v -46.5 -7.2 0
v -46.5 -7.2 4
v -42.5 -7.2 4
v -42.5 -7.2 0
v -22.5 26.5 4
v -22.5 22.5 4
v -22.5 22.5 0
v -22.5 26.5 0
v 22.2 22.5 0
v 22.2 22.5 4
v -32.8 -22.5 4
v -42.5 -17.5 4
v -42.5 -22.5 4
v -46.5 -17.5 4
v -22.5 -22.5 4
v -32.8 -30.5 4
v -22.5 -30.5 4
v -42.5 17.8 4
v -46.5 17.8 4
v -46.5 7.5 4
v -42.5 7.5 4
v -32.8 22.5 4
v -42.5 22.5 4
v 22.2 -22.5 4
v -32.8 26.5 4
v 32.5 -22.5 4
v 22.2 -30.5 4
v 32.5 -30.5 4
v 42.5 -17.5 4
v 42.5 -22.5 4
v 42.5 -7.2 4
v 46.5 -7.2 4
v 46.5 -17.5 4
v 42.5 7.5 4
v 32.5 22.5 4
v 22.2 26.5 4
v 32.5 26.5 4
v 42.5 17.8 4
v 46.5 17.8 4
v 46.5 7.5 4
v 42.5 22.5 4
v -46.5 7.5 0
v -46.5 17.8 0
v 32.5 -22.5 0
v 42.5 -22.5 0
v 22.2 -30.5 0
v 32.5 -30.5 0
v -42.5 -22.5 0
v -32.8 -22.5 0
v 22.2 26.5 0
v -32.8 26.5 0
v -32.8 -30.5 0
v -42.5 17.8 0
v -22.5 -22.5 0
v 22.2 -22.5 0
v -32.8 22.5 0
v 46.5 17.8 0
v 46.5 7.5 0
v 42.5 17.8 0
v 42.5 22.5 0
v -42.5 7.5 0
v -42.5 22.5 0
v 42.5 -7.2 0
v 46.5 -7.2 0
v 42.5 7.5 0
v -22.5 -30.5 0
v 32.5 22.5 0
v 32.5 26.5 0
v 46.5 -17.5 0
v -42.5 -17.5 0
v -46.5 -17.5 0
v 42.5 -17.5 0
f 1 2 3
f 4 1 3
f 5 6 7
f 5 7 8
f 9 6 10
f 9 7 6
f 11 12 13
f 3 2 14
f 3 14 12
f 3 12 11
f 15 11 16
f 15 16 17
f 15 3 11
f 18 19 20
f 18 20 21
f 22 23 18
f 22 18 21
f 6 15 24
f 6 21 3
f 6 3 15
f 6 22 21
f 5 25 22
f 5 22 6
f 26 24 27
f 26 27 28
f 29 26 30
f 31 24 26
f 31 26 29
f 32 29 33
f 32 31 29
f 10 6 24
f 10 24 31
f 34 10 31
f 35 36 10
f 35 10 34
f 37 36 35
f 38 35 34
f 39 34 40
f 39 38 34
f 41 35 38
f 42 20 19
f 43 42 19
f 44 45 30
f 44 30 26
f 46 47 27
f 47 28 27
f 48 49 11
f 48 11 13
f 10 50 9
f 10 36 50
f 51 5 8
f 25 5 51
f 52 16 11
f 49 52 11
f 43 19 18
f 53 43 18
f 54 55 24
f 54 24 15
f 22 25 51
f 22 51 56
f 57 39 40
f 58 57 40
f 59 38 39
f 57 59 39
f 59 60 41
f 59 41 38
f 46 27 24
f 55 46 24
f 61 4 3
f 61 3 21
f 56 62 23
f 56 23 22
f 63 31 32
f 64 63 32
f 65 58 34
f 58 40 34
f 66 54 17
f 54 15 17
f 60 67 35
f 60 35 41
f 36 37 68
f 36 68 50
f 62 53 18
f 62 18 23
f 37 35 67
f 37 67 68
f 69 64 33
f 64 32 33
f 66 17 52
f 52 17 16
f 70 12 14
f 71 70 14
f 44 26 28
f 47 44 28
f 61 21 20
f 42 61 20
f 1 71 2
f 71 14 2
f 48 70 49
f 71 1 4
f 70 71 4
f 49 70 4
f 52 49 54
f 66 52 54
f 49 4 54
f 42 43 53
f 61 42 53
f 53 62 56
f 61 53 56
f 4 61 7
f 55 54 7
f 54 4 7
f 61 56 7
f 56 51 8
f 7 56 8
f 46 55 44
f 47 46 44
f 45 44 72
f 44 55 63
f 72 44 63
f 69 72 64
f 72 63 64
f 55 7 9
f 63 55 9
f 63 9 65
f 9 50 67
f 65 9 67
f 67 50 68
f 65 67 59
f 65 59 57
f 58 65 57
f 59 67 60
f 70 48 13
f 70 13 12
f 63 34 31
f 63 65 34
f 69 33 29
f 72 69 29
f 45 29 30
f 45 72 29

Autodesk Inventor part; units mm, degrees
ref_plane "YZ Plane" through (0, 0, 0) normal (1, 0, 0) x (0, 1, 0)
ref_plane "XZ Plane" through (0, 0, 0) normal (0, 1, 0) x (-1, 0, 0)
sketch "Sketch1" plane through (0, 0, 0) normal (0, 0, 1) x (1, 0, 0)
  line L0 (42.5, -22.5) -> (-42.5, -22.5)
  line L1 (-42.5, -22.5) -> (-42.5, 22.5)
  line L2 (-42.5, 22.5) -> (42.5, 22.5)
  line L3 (42.5, 22.5) -> (42.5, -22.5)
  line L4 (42.5, -22.5) -> (-42.5, 22.5) construction
  line L5 (-42.5, -22.5) -> (42.5, 22.5) construction
  point P0 (0, 0)
  dimension "d0" = 85
  dimension "d1" = 45
extrude "Extrusion1" add sketch "Sketch1" along normal blind 4
sketch "Sketch2" plane through (0, 0, 4) normal (0, 0, 1) x (1, 0, 0)
  line L0 (-42.5, -22.5) -> (42.5, -22.5) projected
  line L1 (42.5, -22.5) -> (42.5, 22.5) projected
  line L2 (42.5, 22.5) -> (-42.5, 22.5) projected
  line L3 (-42.5, 22.5) -> (-42.5, -22.5) projected
  line L4 (42.5, -22.5) -> (42.5, 22.5) projected
  line L5 (42.5, 17.8) -> (46.5, 17.8)
  line L6 (46.5, 17.8) -> (46.5, 7.5)
  line L7 (46.5, 7.5) -> (42.5, 7.5)
  line L8 (42.5, 7.5) -> (42.5, 17.8)
  line L9 (42.5, -7.2) -> (46.5, -7.2)
  line L10 (46.5, -7.2) -> (46.5, -17.5)
  line L11 (46.5, -17.5) -> (42.5, -17.5)
  line L12 (42.5, -17.5) -> (42.5, -7.2)
  point P0 (0, 0)
  dimension "d4" = 4
  dimension "d5" = 10.3
  dimension "d6" = 4
  dimension "d7" = 10.3
extrude "Extrusion2" add sketch "Sketch2" against normal blind 4 contours L1 L9 L10 L11 | L5 L6 L7 L1
ref_plane "Work Plane1" through (0, -7.2, 0) normal (1, 0, 0) x (0, 0, -1)
mirror "Mirror1" about plane through (0, -7.2, 0) normal (1, 0, 0) of "Extrusion2"
sketch "Sketch3" plane through (0, 0, 4) normal (0, 0, 1) x (1, 0, 0)
  line L0 (-42.5, -22.5) -> (42.5, -22.5) projected
  line L1 (-32.8, -22.5) -> (-22.5, -22.5)
  line L2 (-22.5, -22.5) -> (-22.5, -30.5)
  line L3 (-22.5, -30.5) -> (-32.8, -30.5)
  line L4 (-32.8, -30.5) -> (-32.8, -22.5)
  line L5 (22.2, -22.5) -> (32.5, -22.5)
  line L6 (32.5, -22.5) -> (32.5, -30.5)
  line L7 (32.5, -30.5) -> (22.2, -30.5)
  line L8 (22.2, -30.5) -> (22.2, -22.5)
  line L9 (-42.5, -17.5) -> (-42.5, -22.5) projected
  line L10 (42.5, -22.5) -> (42.5, -17.5) projected
  point P0 (0, 0)
  dimension "d12" = 10.3
  dimension "d13" = 8
  dimension "d14" = 10.3
  dimension "d15" = 8
extrude "Extrusion3" add sketch "Sketch3" against normal blind 4
sketch "Sketch5" plane through (0, 0, 4) normal (0, 0, 1) x (1, 0, 0)
  line L0 (42.5, 22.5) -> (-42.5, 22.5) projected
  line L1 (-32.8, 22.5) -> (-22.5, 22.5)
  line L2 (-22.5, 22.5) -> (-22.5, 26.5)
  line L3 (-22.5, 26.5) -> (-32.8, 26.5)
  line L4 (-32.8, 26.5) -> (-32.8, 22.5)
  line L5 (22.2, 22.5) -> (32.5, 22.5)
  line L6 (32.5, 22.5) -> (32.5, 26.5)
  line L7 (32.5, 26.5) -> (22.2, 26.5)
  line L8 (22.2, 26.5) -> (22.2, 22.5)
  line L9 (-42.5, 22.5) -> (-42.5, 17.8) projected
  line L10 (42.5, 17.8) -> (42.5, 22.5) projected
  point P0 (0, 0)
  dimension "d20" = 10.3
  dimension "d21" = 4
  dimension "d22" = 10.3
  dimension "d23" = 4
extrude "Extrusion4" add sketch "Sketch5" against normal blind 4
equation "\"d5\" = d"
equation "\"d7\" = d"
equation "\"d12\" = d"
equation "\"d14\" = d"
equation "\"d20\" = d"
equation "\"d22\" = d"
equation "\"d\" = 10.3"
properties part number "FUENTE 2-02"
